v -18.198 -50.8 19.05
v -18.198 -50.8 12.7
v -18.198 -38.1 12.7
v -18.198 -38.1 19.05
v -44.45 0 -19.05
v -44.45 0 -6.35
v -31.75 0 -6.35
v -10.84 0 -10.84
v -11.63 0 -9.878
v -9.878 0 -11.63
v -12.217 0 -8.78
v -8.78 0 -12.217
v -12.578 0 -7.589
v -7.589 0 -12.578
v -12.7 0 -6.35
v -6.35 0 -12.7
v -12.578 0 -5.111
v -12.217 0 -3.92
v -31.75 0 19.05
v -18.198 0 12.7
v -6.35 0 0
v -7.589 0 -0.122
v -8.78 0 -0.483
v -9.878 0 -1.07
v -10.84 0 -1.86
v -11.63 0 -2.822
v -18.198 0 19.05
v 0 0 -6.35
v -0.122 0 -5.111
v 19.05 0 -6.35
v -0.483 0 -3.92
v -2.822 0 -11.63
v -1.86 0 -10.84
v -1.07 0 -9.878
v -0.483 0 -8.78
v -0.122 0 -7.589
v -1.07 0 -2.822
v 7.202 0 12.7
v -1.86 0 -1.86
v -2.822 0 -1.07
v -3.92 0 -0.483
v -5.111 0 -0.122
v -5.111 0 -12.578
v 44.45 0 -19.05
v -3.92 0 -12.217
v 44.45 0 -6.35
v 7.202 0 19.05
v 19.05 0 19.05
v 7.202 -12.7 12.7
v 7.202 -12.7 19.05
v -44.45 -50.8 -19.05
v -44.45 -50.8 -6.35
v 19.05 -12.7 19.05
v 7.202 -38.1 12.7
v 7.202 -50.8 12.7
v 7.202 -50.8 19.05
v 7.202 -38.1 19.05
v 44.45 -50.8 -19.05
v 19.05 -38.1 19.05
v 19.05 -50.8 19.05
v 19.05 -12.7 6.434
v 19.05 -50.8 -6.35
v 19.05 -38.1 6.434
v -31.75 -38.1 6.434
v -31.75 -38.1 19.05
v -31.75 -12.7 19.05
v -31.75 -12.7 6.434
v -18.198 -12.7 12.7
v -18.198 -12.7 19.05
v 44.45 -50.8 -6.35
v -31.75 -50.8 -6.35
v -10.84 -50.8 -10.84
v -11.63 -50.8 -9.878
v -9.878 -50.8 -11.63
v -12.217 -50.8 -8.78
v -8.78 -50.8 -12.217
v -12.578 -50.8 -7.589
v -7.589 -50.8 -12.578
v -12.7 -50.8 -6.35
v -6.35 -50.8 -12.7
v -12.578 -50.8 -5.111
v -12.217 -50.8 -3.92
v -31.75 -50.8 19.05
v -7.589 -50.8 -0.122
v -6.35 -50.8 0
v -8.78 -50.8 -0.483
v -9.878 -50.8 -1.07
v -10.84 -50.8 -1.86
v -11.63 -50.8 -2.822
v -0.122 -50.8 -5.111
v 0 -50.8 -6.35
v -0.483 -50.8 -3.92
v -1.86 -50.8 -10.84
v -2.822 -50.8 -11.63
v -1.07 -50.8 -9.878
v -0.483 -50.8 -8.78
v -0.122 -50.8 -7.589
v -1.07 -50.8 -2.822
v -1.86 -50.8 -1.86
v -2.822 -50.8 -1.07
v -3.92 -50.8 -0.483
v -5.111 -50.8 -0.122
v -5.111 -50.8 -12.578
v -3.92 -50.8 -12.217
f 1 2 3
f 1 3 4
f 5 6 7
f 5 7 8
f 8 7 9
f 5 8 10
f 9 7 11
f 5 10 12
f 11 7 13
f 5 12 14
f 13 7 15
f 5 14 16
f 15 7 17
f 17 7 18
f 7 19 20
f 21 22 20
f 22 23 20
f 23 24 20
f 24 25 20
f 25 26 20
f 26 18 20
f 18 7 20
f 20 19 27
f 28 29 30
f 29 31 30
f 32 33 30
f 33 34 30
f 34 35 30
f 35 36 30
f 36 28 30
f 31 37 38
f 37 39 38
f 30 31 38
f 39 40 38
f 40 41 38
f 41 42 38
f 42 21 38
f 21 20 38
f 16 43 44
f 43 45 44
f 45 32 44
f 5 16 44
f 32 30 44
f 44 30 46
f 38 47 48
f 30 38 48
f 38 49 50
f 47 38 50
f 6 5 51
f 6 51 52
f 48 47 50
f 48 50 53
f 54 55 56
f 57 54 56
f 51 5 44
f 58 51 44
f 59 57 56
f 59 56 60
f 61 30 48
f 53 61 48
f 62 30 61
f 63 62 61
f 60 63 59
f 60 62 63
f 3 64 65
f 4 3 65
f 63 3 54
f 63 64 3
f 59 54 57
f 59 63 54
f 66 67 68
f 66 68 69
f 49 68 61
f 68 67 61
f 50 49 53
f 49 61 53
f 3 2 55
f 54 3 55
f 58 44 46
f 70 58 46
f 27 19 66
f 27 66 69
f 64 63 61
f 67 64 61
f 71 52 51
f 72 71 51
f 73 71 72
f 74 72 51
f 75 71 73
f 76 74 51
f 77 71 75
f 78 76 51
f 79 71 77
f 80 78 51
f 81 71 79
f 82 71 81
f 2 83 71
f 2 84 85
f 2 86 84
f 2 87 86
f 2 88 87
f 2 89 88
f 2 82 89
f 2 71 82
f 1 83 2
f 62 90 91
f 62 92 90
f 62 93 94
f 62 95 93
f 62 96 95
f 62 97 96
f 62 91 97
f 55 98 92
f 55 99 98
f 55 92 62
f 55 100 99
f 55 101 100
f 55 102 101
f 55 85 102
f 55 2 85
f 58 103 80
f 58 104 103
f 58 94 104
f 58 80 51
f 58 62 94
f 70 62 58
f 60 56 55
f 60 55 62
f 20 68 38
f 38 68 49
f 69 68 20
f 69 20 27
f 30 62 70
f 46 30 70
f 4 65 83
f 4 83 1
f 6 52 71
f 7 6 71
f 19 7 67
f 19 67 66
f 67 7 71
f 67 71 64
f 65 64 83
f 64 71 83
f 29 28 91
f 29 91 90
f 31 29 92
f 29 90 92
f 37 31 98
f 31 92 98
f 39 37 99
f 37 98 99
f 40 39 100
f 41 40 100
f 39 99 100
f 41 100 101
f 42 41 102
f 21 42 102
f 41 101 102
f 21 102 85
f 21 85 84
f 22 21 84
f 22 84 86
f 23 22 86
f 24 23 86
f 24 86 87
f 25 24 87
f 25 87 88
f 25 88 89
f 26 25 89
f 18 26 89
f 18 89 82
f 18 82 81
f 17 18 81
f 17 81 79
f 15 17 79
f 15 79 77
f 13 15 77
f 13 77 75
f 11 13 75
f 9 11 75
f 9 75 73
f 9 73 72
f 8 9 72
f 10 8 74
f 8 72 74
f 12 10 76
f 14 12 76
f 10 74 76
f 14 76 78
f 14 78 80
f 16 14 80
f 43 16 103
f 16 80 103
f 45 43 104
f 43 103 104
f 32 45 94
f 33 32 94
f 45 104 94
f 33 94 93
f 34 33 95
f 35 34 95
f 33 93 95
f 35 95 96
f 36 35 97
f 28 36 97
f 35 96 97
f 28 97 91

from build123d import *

# Parameters (mm, degrees)
F0_W      = 88.9
F0_H      = 38.1
F1_DEPTH  = 50.8
F2_W      = 12.7
F2_H      = 25.4
F3_DEPTH  = 50.801
F4_W      = 25.4
F4_H      = 25.4
F5_DEPTH  = 50.801
F6_W      = 25.4
F6_H      = 6.35
F7_DEPTH  = 50.801
F8_R      = 6.35
F9_DEPTH  = 50.801
F10_W     = 25.4
F10_H     = 12.7
F11_DEPTH = 63.501


with BuildPart() as f1:
    # F0 (on Front) → F1 (new body)
    with BuildSketch(Plane.XZ):
        Rectangle(F0_W, F0_H)
    extrude(amount=F1_DEPTH)

    # F2 (on face) → F3 (cut, through all)
    with BuildSketch(Plane.XZ.offset(50.8)):
        with Locations((-38.1, 6.35)):
            Rectangle(F2_W, F2_H)
    extrude(amount=-F3_DEPTH, mode=Mode.SUBTRACT)

    # F4 (on face) → F5 (cut, through all)
    with BuildSketch(Plane.XZ.offset(50.8)):
        with Locations((31.75, 6.35)):
            Rectangle(F4_W, F4_H)
    extrude(amount=-F5_DEPTH, mode=Mode.SUBTRACT)

    # F6 (on face) → F7 (cut, through all)
    with BuildSketch(Plane.XZ.offset(50.8)):
        with Locations((-5.497764, 15.875)):
            Rectangle(F6_W, F6_H)
    extrude(amount=-F7_DEPTH, mode=Mode.SUBTRACT)

    # F8 (on face) → F9 (cut, through all)
    with BuildSketch(Plane.XZ.offset(50.8)):
        with Locations((-6.35, -6.35)):
            Circle(F8_R)
    extrude(amount=-F9_DEPTH, mode=Mode.SUBTRACT)

    # F10 (on face) → F11 (cut, through all)
    with BuildSketch(Plane.YZ.offset(19.05)):
        with Locations((-25.4, 12.783553)):
            Rectangle(F10_W, F10_H)
    extrude(amount=-F11_DEPTH, mode=Mode.SUBTRACT)


solid = f1.part
